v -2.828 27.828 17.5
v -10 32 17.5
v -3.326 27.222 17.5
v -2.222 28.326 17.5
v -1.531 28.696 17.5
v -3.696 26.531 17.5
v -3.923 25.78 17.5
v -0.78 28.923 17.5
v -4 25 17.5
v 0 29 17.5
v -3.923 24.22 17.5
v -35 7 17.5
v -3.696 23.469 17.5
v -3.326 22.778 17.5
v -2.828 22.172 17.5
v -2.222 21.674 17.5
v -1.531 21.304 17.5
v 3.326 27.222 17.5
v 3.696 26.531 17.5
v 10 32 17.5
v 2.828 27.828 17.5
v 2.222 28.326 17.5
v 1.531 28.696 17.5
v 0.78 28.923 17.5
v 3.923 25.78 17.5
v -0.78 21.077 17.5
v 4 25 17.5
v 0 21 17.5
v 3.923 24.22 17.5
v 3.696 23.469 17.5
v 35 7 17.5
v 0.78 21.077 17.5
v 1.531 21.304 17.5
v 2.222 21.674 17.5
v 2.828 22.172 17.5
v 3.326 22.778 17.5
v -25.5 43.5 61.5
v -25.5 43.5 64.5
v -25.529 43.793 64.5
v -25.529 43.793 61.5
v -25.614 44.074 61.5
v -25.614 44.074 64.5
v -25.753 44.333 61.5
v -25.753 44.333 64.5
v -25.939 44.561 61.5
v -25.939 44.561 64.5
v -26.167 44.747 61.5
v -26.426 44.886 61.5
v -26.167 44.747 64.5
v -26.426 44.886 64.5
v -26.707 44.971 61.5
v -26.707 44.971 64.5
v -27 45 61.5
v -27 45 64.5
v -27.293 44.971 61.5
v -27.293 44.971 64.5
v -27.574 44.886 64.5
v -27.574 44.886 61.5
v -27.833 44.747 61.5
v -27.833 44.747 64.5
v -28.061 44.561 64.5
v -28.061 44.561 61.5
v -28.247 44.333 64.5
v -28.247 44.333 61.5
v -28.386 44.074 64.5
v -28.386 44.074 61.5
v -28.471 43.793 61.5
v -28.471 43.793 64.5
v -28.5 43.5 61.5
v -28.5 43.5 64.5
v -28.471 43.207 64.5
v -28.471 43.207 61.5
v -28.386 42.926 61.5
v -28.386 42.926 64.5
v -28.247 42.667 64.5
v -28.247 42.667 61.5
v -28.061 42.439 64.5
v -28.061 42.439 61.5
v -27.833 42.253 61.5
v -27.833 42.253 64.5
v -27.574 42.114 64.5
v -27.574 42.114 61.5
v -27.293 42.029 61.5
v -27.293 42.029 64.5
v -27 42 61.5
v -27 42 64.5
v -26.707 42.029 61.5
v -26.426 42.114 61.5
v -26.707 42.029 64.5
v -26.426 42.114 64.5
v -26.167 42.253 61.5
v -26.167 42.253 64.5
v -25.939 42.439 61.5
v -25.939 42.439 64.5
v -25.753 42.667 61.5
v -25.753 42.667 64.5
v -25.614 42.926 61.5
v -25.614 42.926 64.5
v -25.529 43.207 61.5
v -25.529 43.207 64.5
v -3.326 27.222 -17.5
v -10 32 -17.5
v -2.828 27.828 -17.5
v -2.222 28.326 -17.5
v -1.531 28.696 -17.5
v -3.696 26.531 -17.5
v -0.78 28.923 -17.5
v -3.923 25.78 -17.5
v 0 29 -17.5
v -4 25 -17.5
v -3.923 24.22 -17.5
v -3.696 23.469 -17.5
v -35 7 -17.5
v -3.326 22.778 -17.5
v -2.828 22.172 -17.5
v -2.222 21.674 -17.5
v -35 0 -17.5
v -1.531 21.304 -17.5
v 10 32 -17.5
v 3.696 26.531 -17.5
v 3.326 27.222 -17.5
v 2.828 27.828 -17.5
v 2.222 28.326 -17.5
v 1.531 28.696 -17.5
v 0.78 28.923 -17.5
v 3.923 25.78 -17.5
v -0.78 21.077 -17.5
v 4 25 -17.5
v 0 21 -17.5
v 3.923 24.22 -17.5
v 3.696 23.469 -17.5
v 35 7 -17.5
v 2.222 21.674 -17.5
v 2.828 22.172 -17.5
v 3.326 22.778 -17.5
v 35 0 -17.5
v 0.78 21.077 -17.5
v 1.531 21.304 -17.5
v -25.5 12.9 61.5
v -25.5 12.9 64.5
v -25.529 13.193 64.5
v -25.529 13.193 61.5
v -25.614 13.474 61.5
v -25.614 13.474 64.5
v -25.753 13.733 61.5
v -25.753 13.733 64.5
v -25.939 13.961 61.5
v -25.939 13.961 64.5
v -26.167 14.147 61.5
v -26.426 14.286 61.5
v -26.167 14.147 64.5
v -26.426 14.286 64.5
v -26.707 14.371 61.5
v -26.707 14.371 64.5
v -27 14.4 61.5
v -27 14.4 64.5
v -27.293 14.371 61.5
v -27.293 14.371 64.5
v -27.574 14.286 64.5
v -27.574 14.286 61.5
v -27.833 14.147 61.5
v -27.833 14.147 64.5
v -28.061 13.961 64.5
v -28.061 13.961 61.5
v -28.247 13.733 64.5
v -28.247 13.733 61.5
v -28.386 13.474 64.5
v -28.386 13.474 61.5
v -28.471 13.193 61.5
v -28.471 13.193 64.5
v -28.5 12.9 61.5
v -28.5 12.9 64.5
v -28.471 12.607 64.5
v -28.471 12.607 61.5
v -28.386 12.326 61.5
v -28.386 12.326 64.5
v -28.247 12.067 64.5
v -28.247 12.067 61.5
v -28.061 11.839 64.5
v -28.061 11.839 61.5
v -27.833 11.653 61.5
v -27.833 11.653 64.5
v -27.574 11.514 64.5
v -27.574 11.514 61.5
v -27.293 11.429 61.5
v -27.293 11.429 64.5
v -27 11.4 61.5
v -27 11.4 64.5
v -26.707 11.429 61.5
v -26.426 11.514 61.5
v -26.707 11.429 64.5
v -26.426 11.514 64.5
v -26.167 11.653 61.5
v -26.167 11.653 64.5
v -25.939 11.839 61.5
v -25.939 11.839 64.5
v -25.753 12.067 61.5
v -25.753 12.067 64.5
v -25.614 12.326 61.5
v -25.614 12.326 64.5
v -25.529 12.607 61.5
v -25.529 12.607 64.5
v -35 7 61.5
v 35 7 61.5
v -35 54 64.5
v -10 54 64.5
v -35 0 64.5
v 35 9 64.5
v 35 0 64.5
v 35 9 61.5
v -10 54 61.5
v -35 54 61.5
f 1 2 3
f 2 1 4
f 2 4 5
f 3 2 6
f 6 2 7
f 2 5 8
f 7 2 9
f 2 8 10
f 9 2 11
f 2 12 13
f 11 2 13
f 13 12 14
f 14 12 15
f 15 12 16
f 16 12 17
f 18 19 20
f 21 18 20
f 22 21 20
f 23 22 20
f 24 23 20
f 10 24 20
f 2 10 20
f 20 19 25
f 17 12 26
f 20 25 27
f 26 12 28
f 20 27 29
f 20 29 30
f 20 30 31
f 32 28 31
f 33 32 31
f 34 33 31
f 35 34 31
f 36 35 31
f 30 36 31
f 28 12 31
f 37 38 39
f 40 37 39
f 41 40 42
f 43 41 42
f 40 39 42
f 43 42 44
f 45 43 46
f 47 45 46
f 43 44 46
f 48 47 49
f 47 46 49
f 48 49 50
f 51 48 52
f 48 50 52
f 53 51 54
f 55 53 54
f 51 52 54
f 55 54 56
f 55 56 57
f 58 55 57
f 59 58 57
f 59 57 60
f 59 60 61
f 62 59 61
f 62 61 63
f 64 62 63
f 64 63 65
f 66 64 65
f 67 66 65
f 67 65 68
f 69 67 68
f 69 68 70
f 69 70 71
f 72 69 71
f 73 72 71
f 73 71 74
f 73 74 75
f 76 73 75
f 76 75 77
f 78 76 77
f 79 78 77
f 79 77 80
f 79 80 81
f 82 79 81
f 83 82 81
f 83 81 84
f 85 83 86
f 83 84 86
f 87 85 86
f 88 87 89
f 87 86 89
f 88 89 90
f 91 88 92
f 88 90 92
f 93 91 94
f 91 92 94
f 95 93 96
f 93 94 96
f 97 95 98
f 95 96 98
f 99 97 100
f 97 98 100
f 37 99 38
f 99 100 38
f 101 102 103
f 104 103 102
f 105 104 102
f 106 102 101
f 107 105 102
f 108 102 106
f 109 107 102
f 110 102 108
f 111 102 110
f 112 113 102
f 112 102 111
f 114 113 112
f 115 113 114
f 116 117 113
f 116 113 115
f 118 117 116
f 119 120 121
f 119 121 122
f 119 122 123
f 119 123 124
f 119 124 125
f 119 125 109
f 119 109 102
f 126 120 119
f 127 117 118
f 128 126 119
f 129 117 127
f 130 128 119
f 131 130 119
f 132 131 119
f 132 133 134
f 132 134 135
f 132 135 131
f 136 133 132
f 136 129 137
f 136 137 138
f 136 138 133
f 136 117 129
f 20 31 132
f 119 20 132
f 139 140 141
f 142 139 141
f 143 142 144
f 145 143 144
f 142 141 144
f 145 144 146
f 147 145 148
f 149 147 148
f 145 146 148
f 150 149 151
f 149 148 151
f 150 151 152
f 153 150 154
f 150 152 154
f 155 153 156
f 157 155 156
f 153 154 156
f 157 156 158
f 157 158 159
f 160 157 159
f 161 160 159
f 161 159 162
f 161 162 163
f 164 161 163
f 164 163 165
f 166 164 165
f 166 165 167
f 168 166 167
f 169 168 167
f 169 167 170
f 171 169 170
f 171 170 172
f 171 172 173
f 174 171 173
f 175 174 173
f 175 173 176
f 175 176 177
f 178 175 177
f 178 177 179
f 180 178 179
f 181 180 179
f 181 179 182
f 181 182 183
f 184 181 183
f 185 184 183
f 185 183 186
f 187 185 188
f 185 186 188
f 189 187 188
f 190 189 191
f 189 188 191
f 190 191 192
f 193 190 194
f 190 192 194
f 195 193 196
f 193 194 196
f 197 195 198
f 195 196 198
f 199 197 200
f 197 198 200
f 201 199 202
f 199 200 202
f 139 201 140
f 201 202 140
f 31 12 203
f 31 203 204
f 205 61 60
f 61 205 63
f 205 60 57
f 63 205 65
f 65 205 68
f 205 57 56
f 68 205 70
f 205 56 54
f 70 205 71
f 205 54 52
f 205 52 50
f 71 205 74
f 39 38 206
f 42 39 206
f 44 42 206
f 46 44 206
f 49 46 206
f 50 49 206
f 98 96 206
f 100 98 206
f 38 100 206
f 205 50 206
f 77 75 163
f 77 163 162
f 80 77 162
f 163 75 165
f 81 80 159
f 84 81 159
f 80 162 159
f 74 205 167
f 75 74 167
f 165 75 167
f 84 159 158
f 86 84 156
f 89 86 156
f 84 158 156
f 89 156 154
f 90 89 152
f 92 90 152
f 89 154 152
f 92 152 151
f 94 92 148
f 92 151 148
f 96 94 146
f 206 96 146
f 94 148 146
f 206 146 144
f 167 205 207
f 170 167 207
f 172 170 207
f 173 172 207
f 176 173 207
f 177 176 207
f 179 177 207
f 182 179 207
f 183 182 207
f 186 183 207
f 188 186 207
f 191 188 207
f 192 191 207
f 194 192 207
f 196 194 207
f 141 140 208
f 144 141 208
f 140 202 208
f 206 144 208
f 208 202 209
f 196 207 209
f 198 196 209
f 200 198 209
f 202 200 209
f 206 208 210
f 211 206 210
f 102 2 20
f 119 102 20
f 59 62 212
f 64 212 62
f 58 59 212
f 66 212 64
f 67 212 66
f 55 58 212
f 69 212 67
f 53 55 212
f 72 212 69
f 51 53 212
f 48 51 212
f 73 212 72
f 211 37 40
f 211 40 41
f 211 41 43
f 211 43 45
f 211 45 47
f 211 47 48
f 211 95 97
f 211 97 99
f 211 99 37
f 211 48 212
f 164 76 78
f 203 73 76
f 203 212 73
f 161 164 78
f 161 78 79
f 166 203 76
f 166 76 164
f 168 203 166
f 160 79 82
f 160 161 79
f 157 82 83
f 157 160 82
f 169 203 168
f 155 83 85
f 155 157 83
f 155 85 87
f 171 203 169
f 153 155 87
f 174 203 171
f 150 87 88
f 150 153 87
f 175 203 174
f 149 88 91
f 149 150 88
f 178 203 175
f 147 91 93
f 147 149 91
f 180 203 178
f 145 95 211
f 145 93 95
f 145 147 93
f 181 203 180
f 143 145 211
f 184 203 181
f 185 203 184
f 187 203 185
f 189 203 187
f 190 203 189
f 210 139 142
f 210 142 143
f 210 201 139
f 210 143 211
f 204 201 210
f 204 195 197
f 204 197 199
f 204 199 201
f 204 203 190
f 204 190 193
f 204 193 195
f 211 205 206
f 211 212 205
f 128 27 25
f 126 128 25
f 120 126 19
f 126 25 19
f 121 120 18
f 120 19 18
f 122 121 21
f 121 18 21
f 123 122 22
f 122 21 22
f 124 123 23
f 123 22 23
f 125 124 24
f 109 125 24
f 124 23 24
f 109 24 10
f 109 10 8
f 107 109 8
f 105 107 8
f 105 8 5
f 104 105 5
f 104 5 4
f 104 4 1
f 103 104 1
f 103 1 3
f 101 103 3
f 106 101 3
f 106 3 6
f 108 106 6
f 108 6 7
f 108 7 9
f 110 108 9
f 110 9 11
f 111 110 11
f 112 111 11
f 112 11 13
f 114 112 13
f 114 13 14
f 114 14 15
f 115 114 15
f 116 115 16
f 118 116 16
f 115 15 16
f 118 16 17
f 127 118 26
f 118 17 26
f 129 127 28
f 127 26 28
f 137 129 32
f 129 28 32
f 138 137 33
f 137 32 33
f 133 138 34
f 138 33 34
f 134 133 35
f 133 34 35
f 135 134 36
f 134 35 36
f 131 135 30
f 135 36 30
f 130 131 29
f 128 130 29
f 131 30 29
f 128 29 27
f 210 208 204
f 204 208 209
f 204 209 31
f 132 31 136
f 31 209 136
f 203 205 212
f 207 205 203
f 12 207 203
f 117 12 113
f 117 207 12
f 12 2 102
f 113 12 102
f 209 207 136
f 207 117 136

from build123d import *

# Parameters (mm, degrees)
SKETCH1_W           = 70
SKETCH1_H           = 35
BOSS_EXTRUDE1_DEPTH = 32
SKETCH2_R           = 4
CUT_EXTRUDE1_DEPTH  = 40
CHAMFER1_SIZE       = 25
SKETCH3_W           = 70
SKETCH3_H           = 7
BOSS_EXTRUDE2_DEPTH = 47
SKETCH4_W           = 70
SKETCH4_H           = 3
BOSS_EXTRUDE3_DEPTH = 47
SKETCH6_R           = 1.5
CUT_EXTRUDE3_DEPTH  = 10
CHAMFER2_SIZE       = 45


with BuildPart() as part:
    # Sketch1 → Boss-Extrude1 (new body)
    with BuildSketch(Plane(origin=(0, 0, 0), x_dir=(1, 0, 0), z_dir=(0, 1, 0))):
        Rectangle(SKETCH1_W, SKETCH1_H)
    extrude(amount=BOSS_EXTRUDE1_DEPTH)

    # Sketch2 → Cut-Extrude1 (cut)
    with BuildSketch(Plane.XY.offset(17.5)):
        with Locations((0, 25)):
            Circle(SKETCH2_R)
    extrude(amount=-CUT_EXTRUDE1_DEPTH, mode=Mode.SUBTRACT)

    # Chamfer1
    chamfer1_edges = [part.edges().sort_by_distance(p)[0] for p in [
        (-35, 32, 0),
        (35, 32, 0),
    ]]
    chamfer(chamfer1_edges, length=CHAMFER1_SIZE)

    # Sketch3 → Boss-Extrude2 (add)
    with BuildSketch(Plane.XY.offset(17.5)):
        with Locations((0, 3.5)):
            Rectangle(SKETCH3_W, SKETCH3_H)
    extrude(amount=BOSS_EXTRUDE2_DEPTH)

    # Sketch4 → Boss-Extrude3 (add)
    with BuildSketch(Plane(origin=(0, 7, 0), x_dir=(1, 0, 0), z_dir=(0, 1, 0))):
        with Locations((0, -63)):
            Rectangle(SKETCH4_W, SKETCH4_H)
    extrude(amount=BOSS_EXTRUDE3_DEPTH)

    # Sketch6 → Cut-Extrude3 (cut)
    with BuildSketch(Plane.XY.offset(64.5)):
        with Locations((-27, 12.9)):
            Circle(SKETCH6_R)
        with Locations((-27, 43.5)):
            Circle(SKETCH6_R)
    extrude(amount=-CUT_EXTRUDE3_DEPTH, mode=Mode.SUBTRACT)

    # Chamfer2
    chamfer2_edges = [part.edges().sort_by_distance(p)[0] for p in [
        (35, 54, 63),
    ]]
    chamfer(chamfer2_edges, length=CHAMFER2_SIZE)


solid = part.part
